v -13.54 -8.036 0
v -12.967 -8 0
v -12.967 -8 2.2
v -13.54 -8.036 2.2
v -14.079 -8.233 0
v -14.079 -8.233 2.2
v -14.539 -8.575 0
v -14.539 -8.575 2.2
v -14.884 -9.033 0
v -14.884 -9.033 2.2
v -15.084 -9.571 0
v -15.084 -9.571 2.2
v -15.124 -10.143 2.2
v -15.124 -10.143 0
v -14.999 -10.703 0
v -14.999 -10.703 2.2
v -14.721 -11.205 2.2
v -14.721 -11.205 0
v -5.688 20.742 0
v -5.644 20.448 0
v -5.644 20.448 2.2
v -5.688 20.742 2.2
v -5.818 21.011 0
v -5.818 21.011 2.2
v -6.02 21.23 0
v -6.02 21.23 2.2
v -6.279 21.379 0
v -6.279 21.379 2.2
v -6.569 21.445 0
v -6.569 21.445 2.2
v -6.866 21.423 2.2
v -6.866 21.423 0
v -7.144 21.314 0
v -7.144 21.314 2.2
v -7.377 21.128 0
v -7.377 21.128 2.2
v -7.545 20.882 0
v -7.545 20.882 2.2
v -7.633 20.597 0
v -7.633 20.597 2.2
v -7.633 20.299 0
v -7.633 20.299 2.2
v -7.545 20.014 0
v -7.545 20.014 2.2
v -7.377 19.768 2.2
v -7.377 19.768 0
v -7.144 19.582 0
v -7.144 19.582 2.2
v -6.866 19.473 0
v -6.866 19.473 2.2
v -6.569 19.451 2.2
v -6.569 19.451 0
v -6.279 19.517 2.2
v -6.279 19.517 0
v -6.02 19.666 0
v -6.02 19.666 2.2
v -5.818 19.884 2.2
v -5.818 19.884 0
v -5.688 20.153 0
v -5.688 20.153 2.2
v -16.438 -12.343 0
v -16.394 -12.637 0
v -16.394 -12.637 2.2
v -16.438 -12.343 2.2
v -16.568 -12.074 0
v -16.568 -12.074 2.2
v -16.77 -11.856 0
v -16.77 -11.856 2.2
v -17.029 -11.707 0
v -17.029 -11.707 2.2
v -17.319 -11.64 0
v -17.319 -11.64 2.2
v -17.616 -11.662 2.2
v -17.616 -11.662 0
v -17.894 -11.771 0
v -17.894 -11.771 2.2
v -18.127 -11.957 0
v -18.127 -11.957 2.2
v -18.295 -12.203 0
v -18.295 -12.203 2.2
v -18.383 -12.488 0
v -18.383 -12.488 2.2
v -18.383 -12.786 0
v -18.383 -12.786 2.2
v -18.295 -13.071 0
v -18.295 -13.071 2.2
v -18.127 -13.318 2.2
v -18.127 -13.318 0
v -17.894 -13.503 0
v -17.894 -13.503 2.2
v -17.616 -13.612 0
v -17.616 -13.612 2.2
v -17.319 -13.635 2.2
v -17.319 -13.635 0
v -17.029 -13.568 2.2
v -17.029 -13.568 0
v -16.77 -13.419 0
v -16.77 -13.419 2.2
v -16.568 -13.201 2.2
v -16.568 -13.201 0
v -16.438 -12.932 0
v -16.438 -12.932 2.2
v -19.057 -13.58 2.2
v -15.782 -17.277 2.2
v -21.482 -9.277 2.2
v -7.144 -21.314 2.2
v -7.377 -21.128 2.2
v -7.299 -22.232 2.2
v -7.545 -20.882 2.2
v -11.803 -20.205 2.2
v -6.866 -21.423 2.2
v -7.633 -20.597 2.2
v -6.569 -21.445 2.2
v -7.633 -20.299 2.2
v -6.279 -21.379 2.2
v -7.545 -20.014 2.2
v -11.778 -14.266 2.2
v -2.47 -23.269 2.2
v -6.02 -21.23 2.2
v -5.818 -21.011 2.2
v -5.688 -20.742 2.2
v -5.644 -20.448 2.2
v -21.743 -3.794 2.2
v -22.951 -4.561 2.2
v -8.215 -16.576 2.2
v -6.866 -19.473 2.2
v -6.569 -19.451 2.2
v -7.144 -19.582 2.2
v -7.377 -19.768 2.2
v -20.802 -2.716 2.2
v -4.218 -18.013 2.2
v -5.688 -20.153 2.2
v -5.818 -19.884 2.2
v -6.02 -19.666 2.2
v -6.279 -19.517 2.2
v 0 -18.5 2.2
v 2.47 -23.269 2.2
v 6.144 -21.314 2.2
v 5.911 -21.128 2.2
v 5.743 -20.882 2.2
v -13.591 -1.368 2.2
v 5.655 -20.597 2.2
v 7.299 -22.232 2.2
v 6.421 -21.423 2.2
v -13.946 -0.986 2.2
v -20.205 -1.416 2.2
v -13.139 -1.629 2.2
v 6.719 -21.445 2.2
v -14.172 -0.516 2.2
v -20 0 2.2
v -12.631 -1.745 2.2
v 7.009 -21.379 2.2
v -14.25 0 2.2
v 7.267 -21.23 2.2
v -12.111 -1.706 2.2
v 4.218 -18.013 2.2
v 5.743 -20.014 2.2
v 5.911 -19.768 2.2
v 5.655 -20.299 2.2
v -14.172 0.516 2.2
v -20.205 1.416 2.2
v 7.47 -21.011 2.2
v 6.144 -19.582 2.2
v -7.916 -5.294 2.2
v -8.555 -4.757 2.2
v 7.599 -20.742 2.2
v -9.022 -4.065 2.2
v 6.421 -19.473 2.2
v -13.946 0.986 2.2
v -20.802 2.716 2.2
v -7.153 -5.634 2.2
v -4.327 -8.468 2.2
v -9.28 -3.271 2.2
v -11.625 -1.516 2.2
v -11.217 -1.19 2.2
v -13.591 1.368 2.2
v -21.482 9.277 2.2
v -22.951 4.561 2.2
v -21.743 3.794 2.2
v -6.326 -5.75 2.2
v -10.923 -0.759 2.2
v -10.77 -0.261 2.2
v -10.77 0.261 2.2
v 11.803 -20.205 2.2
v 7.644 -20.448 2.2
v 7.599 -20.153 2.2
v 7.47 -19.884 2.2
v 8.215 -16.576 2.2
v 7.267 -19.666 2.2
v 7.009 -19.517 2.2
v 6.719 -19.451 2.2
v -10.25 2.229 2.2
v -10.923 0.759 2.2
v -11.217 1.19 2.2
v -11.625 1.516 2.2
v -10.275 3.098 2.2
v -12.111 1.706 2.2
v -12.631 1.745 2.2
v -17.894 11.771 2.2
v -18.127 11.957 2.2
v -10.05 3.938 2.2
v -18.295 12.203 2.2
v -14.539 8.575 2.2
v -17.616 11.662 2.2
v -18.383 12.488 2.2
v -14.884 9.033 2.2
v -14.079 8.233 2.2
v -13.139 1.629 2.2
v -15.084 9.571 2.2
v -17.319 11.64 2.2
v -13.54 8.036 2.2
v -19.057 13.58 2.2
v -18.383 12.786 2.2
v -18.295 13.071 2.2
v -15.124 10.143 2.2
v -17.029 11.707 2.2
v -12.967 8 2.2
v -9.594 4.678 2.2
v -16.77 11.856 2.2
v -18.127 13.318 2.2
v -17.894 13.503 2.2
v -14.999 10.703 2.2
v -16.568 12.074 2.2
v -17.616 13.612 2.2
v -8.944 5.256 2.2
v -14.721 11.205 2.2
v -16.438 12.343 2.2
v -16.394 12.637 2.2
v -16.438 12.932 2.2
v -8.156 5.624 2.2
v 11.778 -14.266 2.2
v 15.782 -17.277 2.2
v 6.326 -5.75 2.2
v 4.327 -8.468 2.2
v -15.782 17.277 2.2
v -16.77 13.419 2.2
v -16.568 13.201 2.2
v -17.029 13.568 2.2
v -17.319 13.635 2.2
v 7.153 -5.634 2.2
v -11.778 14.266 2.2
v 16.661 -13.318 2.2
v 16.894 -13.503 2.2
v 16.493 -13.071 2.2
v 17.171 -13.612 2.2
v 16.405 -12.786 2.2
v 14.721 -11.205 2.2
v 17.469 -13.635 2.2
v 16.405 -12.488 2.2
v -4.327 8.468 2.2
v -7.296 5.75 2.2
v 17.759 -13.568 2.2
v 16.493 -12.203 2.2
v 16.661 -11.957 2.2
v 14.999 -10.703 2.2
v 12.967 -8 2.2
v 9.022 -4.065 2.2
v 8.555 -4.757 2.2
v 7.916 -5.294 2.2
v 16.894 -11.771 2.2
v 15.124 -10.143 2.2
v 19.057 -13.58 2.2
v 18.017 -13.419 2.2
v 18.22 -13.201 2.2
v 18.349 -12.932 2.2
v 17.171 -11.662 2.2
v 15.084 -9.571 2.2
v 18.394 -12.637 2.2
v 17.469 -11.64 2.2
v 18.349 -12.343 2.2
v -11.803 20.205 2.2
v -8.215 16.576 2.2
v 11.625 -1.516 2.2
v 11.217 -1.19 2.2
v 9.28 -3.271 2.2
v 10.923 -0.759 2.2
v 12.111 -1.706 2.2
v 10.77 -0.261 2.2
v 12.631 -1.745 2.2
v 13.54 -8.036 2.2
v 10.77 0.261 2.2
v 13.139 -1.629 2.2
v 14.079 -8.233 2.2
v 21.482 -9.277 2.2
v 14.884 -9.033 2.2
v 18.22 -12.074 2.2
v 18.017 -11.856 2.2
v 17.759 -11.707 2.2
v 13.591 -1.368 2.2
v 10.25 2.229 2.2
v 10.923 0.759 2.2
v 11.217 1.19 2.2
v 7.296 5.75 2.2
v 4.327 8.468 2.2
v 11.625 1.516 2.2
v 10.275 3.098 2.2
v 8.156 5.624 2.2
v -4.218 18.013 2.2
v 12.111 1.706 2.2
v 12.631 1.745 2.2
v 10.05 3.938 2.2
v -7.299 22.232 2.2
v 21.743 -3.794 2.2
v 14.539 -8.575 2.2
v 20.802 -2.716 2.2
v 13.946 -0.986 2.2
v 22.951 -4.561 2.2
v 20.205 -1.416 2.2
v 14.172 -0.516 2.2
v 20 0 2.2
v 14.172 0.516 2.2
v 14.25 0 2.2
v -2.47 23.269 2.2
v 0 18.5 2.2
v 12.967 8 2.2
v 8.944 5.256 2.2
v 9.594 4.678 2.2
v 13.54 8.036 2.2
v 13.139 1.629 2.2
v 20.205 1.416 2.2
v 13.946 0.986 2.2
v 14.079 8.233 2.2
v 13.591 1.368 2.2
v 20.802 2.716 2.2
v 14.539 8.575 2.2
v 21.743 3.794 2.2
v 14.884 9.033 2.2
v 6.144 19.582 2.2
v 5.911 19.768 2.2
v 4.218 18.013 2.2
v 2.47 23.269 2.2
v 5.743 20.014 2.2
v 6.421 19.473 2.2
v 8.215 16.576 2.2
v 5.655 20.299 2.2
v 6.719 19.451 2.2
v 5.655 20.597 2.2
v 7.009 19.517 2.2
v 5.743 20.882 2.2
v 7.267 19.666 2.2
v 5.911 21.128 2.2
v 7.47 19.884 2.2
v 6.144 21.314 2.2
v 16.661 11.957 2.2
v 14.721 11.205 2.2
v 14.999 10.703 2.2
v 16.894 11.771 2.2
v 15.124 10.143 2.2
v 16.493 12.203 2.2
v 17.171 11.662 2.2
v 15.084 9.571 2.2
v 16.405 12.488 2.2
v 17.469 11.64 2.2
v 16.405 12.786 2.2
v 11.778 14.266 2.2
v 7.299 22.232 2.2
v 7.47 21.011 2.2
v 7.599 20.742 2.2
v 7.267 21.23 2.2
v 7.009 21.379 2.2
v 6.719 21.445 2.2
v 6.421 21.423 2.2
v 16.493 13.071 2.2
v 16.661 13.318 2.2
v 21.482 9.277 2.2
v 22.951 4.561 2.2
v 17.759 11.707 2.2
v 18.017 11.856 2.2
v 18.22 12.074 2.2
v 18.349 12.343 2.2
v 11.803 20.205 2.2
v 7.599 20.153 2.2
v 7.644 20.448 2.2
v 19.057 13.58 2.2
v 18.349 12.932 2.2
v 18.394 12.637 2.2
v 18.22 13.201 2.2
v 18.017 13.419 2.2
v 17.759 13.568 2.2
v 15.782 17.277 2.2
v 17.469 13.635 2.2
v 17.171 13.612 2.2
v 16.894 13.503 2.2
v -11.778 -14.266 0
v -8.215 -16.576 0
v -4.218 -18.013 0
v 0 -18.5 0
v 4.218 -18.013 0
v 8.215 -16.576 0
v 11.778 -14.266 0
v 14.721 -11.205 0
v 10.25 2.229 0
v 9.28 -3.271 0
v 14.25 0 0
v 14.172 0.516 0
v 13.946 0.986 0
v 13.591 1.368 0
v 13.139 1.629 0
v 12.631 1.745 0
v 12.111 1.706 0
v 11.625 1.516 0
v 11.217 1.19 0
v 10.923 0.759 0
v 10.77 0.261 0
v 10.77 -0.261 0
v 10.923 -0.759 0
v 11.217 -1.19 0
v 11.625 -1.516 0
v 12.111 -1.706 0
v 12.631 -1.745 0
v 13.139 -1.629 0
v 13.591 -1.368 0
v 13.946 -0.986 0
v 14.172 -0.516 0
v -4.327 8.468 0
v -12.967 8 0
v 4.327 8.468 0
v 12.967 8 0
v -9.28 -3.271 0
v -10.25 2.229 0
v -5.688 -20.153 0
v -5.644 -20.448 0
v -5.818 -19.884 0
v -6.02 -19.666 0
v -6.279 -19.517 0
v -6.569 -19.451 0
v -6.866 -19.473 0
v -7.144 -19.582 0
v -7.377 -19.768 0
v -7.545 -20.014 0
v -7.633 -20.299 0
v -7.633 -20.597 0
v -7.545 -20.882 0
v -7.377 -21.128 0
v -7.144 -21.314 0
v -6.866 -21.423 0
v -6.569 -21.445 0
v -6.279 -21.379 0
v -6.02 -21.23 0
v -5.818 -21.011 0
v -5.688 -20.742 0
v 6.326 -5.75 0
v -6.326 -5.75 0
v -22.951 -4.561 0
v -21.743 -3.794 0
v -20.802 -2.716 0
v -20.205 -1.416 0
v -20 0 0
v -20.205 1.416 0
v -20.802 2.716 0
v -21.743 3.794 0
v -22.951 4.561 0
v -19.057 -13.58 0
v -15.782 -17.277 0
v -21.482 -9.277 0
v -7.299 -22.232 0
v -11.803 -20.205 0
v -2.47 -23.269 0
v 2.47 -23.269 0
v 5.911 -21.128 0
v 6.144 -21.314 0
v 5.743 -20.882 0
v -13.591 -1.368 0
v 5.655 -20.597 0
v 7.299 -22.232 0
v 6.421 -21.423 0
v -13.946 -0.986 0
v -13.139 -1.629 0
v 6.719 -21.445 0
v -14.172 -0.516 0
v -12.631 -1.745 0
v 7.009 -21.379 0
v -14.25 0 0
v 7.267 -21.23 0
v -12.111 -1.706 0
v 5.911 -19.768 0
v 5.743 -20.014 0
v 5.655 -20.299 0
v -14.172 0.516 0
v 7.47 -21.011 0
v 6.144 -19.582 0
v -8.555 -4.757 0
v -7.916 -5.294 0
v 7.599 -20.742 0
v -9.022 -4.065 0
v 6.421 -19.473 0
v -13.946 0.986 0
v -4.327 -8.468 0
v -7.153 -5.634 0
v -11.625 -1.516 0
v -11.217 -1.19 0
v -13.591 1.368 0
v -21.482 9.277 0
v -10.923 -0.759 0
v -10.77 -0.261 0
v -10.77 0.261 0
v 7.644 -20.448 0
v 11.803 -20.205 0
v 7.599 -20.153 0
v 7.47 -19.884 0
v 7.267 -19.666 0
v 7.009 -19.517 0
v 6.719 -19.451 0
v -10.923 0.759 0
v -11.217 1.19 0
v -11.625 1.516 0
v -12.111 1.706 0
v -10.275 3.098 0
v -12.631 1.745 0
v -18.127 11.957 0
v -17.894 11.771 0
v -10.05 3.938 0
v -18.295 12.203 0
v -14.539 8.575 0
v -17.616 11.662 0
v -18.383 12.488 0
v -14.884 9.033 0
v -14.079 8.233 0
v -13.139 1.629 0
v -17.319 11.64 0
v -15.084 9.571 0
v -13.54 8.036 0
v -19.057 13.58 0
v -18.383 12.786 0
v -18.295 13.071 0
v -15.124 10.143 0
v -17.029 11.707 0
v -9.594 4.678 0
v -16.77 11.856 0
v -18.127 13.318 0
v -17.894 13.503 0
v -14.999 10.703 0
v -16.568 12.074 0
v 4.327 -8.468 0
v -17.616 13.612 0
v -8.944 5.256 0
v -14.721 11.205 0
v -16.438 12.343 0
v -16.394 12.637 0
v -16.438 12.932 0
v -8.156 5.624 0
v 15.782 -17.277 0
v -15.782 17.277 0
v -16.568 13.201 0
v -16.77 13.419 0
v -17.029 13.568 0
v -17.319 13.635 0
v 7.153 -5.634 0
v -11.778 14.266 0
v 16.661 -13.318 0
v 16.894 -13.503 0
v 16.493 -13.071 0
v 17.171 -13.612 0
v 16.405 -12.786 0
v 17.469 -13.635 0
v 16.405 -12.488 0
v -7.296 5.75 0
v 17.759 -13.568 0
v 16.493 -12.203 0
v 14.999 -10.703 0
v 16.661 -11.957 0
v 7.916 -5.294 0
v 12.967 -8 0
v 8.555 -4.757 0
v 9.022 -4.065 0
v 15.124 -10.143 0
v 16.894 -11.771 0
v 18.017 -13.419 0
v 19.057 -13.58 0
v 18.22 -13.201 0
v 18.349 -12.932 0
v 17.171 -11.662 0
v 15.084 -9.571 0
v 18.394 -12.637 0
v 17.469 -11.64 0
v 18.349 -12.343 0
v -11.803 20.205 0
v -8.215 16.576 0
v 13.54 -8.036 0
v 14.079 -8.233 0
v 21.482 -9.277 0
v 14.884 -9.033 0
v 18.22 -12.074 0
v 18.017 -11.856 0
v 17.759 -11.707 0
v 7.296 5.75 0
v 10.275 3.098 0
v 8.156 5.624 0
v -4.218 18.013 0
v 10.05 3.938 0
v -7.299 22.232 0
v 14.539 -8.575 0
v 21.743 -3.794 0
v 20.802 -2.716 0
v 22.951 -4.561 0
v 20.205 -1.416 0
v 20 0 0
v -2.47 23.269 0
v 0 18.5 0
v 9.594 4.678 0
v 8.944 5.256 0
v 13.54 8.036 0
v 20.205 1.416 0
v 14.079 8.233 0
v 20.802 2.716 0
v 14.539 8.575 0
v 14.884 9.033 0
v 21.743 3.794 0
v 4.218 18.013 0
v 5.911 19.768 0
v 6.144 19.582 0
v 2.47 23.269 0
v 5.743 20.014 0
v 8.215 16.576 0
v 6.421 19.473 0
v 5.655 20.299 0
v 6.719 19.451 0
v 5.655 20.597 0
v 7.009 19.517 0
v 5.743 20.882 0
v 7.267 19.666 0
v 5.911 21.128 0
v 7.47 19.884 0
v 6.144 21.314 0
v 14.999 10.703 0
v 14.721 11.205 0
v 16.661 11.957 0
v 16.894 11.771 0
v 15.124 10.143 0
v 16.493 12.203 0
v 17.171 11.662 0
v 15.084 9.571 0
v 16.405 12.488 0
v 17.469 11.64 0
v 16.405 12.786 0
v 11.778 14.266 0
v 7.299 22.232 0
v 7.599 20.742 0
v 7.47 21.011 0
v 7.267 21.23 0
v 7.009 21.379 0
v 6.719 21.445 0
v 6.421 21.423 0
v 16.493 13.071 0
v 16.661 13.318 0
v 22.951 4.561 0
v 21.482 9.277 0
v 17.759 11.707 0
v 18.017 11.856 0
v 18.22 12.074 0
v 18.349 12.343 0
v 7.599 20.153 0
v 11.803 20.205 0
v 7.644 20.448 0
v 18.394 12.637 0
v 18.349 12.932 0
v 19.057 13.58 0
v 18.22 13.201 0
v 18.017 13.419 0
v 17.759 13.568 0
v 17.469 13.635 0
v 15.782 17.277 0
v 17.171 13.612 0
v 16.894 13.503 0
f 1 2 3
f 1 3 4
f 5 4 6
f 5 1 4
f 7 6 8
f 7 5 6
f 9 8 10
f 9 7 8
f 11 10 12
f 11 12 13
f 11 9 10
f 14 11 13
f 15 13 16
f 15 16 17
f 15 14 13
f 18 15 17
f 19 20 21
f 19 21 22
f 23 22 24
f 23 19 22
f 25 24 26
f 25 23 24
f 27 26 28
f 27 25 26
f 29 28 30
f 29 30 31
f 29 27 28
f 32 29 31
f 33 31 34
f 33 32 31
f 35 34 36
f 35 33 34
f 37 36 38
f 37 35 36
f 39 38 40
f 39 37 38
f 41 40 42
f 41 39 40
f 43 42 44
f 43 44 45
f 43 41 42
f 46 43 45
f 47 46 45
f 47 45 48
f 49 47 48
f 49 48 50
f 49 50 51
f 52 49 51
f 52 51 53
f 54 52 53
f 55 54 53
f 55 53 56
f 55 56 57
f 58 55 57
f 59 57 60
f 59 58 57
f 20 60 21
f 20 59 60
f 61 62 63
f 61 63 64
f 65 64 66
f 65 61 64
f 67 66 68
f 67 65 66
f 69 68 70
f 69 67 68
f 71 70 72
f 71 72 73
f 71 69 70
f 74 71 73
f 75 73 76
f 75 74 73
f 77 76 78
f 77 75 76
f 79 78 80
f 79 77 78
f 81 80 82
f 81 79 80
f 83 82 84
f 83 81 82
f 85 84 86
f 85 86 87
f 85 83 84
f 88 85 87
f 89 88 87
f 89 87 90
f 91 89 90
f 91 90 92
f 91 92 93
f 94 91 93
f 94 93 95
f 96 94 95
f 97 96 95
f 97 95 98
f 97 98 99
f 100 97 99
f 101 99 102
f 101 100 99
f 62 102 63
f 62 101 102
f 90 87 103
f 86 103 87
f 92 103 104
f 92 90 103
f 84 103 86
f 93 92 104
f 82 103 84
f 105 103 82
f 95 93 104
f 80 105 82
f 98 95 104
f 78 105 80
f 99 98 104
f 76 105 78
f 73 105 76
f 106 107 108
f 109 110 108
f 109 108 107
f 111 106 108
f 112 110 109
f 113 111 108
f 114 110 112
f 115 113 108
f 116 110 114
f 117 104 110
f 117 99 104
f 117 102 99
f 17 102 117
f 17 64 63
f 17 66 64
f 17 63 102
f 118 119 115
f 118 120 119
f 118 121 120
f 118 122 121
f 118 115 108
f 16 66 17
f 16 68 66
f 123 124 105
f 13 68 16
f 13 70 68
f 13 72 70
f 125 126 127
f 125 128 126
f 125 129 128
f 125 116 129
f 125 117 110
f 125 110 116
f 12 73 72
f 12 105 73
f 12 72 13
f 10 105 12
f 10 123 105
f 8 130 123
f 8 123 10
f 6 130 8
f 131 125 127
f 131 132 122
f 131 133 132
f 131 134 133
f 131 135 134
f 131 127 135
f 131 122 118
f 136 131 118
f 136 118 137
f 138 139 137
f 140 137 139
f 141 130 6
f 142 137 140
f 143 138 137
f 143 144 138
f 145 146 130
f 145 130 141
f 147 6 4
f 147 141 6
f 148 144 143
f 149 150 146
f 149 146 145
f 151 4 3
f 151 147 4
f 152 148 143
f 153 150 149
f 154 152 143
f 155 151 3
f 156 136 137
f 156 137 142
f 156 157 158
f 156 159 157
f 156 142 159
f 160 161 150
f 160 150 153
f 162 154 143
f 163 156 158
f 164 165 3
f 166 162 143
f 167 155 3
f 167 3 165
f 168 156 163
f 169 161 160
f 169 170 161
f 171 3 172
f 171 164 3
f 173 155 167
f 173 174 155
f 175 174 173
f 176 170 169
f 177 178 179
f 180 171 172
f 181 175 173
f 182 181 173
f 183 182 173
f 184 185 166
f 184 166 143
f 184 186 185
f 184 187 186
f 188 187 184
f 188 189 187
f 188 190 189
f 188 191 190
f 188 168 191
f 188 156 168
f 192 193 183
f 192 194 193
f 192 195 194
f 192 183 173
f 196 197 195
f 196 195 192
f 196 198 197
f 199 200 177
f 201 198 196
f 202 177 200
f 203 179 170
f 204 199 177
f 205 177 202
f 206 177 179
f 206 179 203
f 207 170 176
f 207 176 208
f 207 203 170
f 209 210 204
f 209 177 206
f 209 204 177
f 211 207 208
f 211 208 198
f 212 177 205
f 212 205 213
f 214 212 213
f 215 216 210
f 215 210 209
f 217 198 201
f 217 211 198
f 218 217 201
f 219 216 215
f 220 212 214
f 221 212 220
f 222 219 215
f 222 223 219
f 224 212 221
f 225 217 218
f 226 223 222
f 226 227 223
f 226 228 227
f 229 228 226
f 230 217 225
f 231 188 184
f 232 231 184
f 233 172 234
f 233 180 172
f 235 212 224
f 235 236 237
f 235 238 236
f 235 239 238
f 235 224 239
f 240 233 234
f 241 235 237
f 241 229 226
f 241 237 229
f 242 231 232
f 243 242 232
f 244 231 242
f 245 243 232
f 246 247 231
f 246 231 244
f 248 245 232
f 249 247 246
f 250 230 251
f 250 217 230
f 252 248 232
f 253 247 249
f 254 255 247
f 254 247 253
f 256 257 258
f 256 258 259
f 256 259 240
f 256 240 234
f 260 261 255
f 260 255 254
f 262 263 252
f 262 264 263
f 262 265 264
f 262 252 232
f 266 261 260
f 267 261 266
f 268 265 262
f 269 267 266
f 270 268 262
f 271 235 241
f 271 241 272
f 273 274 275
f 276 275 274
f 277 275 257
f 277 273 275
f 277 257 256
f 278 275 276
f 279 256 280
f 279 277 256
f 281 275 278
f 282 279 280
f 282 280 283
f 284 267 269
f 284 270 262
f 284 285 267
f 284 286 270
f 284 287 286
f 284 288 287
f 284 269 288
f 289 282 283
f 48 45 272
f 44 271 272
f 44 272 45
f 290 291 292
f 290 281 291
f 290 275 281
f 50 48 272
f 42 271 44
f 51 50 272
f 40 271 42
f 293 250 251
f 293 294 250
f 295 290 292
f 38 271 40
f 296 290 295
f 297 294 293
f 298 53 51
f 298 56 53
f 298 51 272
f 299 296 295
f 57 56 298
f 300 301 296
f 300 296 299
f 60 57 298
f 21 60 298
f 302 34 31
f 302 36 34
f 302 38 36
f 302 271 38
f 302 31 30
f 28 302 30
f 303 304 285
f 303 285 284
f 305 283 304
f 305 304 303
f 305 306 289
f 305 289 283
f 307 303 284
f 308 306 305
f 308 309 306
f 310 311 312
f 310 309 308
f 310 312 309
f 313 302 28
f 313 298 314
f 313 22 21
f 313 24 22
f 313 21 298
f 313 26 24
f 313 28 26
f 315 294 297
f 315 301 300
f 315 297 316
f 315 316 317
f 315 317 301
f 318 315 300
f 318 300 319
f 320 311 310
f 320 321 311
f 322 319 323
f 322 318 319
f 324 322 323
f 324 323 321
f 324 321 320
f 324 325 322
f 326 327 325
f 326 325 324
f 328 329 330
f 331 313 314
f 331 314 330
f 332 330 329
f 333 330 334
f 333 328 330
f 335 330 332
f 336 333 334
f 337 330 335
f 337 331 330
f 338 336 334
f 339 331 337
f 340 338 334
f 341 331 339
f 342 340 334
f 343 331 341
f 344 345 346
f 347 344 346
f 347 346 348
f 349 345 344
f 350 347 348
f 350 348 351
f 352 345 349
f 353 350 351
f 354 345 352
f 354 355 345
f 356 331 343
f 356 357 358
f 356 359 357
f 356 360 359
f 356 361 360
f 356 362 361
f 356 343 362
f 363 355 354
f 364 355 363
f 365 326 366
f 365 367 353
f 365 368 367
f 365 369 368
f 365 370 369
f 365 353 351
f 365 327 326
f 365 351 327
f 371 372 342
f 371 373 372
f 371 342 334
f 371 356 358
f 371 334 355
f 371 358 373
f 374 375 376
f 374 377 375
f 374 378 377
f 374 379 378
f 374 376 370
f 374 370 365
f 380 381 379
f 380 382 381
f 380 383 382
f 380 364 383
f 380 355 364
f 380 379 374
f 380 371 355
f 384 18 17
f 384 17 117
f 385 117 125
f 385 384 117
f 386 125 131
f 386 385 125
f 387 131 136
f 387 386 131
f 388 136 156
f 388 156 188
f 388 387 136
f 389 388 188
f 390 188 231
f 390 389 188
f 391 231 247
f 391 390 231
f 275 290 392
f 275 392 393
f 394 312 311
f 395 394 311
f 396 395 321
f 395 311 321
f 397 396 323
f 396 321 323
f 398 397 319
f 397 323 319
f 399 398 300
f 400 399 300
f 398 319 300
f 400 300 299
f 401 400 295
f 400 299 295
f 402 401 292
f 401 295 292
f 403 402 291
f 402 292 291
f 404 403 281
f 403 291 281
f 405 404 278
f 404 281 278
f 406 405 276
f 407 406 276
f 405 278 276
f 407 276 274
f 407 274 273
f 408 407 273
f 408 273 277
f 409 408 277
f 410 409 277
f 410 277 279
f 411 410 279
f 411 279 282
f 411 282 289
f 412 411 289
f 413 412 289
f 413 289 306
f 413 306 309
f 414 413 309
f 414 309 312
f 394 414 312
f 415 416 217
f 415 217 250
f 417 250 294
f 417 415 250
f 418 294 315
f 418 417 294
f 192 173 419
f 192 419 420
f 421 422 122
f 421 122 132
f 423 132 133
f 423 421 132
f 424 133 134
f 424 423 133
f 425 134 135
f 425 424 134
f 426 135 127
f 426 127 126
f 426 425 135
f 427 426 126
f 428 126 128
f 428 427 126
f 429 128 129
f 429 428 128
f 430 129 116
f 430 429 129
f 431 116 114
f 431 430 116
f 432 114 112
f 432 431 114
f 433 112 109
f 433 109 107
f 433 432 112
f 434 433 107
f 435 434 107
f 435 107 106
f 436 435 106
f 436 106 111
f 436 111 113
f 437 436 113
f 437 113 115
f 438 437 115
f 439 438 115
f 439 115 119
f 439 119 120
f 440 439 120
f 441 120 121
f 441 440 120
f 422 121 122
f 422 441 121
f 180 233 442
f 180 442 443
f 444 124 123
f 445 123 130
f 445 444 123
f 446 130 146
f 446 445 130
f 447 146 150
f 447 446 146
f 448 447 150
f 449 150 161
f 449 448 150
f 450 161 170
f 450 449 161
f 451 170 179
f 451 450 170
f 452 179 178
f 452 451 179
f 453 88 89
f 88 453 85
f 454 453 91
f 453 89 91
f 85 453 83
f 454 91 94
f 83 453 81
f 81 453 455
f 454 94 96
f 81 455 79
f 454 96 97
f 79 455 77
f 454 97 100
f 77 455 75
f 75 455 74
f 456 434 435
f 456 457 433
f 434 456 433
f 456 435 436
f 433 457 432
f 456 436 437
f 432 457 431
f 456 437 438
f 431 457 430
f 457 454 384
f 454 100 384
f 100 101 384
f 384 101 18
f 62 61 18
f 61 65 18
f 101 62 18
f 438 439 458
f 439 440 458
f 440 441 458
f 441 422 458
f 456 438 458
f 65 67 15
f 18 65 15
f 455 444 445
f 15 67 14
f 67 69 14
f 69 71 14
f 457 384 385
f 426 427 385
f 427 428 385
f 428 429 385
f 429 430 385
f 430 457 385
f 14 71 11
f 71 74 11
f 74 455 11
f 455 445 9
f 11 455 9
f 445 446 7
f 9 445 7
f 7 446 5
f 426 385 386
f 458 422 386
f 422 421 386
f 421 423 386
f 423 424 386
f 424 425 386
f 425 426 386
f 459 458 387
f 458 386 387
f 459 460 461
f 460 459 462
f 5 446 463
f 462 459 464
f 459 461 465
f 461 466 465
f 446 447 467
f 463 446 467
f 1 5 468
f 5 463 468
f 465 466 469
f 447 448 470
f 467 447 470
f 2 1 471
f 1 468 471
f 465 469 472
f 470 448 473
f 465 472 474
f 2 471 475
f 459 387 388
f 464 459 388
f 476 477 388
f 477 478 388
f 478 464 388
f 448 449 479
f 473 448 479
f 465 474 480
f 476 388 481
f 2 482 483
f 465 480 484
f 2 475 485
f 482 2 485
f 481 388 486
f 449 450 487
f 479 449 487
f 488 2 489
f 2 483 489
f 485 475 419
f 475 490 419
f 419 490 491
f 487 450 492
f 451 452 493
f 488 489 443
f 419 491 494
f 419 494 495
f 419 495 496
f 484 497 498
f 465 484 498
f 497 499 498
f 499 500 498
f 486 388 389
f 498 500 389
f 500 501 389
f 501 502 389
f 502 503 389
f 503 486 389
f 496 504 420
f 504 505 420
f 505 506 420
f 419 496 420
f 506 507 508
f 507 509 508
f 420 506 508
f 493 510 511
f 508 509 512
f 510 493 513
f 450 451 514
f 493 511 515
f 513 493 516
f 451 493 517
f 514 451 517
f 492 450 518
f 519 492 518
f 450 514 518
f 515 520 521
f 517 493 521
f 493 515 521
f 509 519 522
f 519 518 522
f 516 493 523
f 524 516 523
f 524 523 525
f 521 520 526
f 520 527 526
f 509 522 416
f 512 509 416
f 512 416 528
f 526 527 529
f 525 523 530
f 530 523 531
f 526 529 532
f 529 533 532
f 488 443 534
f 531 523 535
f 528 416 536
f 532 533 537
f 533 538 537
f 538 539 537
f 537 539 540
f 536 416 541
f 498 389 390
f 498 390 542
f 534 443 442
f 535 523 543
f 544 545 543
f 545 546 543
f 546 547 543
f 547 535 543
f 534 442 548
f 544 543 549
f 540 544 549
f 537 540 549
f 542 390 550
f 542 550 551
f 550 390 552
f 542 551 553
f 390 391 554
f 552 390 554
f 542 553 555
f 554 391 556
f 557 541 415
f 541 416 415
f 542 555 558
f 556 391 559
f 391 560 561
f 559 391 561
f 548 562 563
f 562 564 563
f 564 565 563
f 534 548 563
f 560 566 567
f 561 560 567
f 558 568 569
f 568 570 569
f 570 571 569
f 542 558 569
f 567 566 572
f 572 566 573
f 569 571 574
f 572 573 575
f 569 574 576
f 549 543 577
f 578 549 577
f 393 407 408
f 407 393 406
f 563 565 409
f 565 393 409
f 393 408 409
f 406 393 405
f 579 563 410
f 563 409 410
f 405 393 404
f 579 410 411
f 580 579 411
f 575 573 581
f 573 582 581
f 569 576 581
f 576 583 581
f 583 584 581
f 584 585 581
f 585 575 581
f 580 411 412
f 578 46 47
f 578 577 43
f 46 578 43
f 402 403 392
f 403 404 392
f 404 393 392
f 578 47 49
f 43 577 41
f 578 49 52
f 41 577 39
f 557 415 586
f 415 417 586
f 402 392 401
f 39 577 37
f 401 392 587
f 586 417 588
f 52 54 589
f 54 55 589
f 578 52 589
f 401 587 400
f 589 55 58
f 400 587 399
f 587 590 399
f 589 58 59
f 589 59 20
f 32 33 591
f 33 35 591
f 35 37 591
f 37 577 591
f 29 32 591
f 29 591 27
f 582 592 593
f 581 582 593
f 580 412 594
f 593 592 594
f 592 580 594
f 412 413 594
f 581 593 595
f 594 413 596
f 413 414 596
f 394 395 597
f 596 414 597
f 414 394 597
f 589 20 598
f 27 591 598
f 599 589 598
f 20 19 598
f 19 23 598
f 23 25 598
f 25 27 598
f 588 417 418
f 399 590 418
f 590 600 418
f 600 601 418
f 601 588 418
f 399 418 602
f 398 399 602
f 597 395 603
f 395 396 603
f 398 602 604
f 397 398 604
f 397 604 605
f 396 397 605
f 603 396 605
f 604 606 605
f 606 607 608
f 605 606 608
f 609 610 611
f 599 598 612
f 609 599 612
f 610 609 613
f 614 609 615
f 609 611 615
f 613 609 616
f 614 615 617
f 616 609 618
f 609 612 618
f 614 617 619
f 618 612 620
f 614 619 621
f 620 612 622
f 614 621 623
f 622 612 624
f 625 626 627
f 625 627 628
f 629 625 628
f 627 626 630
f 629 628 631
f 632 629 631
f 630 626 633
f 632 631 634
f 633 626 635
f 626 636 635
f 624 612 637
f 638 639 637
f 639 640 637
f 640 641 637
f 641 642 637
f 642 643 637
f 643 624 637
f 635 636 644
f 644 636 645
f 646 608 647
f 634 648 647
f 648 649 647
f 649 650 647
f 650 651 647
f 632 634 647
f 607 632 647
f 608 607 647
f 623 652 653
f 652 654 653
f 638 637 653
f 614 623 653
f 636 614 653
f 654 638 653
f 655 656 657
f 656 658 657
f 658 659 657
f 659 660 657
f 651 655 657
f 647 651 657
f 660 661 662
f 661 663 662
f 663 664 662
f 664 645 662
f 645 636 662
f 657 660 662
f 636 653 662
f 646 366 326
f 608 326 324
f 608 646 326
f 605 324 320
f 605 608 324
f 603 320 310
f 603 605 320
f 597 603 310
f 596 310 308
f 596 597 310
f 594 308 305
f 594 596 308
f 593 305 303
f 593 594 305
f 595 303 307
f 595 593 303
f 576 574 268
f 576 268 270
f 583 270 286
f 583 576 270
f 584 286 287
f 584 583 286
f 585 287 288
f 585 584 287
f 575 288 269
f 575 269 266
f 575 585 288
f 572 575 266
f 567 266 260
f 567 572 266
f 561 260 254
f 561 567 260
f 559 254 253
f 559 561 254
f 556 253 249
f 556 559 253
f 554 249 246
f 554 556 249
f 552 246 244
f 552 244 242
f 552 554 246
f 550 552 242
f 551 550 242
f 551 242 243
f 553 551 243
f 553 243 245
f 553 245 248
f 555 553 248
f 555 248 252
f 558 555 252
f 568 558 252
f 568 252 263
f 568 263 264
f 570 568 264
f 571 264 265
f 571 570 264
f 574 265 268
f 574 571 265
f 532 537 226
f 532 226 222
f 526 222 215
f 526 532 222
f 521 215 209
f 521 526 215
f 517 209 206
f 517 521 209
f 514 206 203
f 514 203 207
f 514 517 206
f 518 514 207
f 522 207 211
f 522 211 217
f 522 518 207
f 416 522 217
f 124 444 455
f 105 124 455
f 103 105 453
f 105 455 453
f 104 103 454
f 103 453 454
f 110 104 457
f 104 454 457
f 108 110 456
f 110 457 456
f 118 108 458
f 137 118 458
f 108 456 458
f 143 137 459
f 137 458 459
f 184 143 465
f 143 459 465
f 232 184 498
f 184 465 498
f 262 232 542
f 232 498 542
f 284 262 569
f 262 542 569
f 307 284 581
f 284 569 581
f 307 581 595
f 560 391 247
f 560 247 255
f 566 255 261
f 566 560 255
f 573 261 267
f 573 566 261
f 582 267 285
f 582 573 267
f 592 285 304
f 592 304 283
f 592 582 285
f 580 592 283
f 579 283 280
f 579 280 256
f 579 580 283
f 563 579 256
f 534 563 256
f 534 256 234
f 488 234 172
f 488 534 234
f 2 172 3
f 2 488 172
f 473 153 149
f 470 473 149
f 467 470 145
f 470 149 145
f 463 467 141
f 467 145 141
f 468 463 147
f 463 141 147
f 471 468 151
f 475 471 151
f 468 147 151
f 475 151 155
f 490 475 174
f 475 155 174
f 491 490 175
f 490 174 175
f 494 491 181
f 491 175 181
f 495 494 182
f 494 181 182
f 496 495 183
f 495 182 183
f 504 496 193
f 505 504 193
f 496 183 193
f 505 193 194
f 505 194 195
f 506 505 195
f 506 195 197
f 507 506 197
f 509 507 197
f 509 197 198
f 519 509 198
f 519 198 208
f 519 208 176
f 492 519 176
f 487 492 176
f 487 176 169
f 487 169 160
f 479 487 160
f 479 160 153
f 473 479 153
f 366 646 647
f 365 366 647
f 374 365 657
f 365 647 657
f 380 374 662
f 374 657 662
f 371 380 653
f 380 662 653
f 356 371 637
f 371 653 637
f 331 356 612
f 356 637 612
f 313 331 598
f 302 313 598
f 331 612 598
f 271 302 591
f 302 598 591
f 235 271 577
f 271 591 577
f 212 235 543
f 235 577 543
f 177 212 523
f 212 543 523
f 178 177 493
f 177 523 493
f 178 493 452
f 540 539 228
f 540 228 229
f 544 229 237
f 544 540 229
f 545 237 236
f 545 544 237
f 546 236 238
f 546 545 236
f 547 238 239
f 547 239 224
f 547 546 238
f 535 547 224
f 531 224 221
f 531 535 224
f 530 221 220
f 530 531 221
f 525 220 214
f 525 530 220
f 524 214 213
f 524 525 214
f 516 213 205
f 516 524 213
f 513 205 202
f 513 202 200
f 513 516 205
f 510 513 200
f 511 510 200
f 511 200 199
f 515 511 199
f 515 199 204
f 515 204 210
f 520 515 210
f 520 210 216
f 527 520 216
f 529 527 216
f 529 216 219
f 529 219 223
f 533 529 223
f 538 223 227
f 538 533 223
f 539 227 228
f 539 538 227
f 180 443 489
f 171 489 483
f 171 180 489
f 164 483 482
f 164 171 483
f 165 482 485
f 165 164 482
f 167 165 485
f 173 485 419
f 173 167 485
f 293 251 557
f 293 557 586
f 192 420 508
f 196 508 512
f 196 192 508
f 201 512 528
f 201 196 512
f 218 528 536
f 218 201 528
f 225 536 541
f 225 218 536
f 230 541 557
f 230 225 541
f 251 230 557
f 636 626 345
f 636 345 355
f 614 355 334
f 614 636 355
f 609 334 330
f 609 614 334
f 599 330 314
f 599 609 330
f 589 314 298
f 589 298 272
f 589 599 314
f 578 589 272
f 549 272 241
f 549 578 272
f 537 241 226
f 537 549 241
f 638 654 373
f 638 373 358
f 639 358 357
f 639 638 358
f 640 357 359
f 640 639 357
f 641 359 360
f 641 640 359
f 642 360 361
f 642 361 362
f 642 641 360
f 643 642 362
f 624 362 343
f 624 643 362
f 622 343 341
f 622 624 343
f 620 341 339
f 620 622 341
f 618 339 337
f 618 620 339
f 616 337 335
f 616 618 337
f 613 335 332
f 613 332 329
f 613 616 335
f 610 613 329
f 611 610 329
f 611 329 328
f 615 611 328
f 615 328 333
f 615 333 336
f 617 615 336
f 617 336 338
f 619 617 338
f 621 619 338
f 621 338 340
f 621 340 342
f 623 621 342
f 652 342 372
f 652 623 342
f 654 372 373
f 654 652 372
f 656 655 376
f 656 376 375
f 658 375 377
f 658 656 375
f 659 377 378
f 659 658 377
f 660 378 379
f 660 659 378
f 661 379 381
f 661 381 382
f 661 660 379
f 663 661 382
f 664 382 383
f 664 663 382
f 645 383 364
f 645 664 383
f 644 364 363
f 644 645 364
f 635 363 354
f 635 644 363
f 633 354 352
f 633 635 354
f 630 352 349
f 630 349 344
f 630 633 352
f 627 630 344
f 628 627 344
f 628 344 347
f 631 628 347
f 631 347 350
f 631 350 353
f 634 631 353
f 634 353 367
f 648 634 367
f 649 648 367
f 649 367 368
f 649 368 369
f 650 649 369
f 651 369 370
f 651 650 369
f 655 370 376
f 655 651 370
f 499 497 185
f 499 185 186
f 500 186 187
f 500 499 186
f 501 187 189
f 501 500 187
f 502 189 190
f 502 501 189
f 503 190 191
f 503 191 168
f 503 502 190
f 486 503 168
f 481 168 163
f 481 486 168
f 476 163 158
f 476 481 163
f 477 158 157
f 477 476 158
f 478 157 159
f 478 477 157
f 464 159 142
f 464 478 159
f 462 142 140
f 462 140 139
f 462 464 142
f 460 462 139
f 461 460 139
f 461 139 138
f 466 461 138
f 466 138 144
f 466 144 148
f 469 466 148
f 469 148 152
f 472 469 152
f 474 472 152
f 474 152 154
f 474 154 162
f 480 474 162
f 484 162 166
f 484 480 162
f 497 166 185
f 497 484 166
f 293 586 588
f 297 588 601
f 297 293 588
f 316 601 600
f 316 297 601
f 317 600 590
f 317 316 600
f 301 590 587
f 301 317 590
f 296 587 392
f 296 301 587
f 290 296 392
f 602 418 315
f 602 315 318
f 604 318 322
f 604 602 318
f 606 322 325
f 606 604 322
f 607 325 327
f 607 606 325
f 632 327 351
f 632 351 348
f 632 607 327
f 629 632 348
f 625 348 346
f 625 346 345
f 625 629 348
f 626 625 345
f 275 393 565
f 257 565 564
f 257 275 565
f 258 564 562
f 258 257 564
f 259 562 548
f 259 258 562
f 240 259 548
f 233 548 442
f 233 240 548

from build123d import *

# Parameters (mm, degrees)
SKIZZE1_R                       = 23.4
SKIZZE1_R_2                     = 1
LINEAR_AUSTRAGEN1_DEPTH         = 2.2
SKIZZE3_R                       = 1.75
SCHNITT_LINEAR_AUSTRAGEN3_DEPTH = 34.165644875
SKETCH1_R                       = 5
CUT_EXTRUDE1_DEPTH              = 3


with BuildPart() as part:
    # Skizze1 → Linear austragen1 (new body)
    with BuildSketch(Plane.XY):
        Circle(SKIZZE1_R)
        with Locations((6.643865379, 20.4477151)):
            Circle(SKIZZE1_R_2, mode=Mode.SUBTRACT)
        with Locations((17.393865379, 12.637382924)):
            Circle(SKIZZE1_R_2, mode=Mode.SUBTRACT)
        with Locations((17.393865379, -12.637382924)):
            Circle(SKIZZE1_R_2, mode=Mode.SUBTRACT)
        with Locations((-6.643865379, 20.4477151)):
            Circle(SKIZZE1_R_2, mode=Mode.SUBTRACT)
        with Locations((6.643865379, -20.4477151)):
            Circle(SKIZZE1_R_2, mode=Mode.SUBTRACT)
        with Locations((-6.643865379, -20.4477151)):
            Circle(SKIZZE1_R_2, mode=Mode.SUBTRACT)
        with Locations((-17.393865379, -12.637382924)):
            Circle(SKIZZE1_R_2, mode=Mode.SUBTRACT)
        with Locations((-17.393865379, 12.637382924)):
            Circle(SKIZZE1_R_2, mode=Mode.SUBTRACT)
        with BuildLine():
            ThreePointArc((14.720859381, 11.20474449), (0, 18.5), (-14.720859381, 11.20474449))
            ThreePointArc((-14.720859381, 11.20474449), (-14.883940446, 9.033399462), (-12.967323579, 8))
            ThreePointArc((-12.967323579, 8), (0, 8.526339105), (12.967323579, 8))
            ThreePointArc((12.967323579, 8), (14.883940446, 9.033399462), (14.720859381, 11.20474449))
        make_face(mode=Mode.SUBTRACT)
        with BuildLine():
            ThreePointArc((-14.720859381, -11.20474449), (0, -18.5), (14.720859381, -11.20474449))
            ThreePointArc((14.720859381, -11.20474449), (14.883940446, -9.033399462), (12.967323579, -8))
            ThreePointArc((12.967323579, -8), (0, -8.526339105), (-12.967323579, -8))
            ThreePointArc((-12.967323579, -8), (-14.883940446, -9.033399462), (-14.720859381, -11.20474449))
        make_face(mode=Mode.SUBTRACT)
    extrude(amount=LINEAR_AUSTRAGEN1_DEPTH)

    # Skizze3 → Schnitt-Linear austragen3 (cut, through all)
    with BuildSketch(Plane.XY.offset(2.2)):
        with Locations((12.5, 0)):
            Circle(SKIZZE3_R)
        with Locations(Location((-12.5, 0, 0), (0, 0, 180))):
            Circle(SKIZZE3_R)
        with BuildLine():
            Line((-7.295576741, 5.75), (7.295576741, 5.75))
            ThreePointArc((7.295576741, 5.75), (9.59371007, 4.678362829), (10.25, 2.229055467))
            Line((10.25, 2.229055467), (9.280201606, -3.270944533))
            ThreePointArc((9.280201606, -3.270944533), (8.254141176, -5.048133329), (6.325778347, -5.75))
            Line((6.325778347, -5.75), (-6.325778347, -5.75))
            ThreePointArc((-6.325778347, -5.75), (-8.254141176, -5.048133329), (-9.280201606, -3.270944533))
            Line((-9.280201606, -3.270944533), (-10.25, 2.229055467))
            ThreePointArc((-10.25, 2.229055467), (-9.59371007, 4.678362829), (-7.295576741, 5.75))
        make_face()
    extrude(amount=-SCHNITT_LINEAR_AUSTRAGEN3_DEPTH, mode=Mode.SUBTRACT)

    # Sketch1 → Cut-Extrude1 (cut)
    with BuildSketch(Plane.XY):
        with Locations((-25, 0)):
            Circle(SKETCH1_R)
        with Locations((25, 0)):
            Circle(SKETCH1_R)
    extrude(amount=CUT_EXTRUDE1_DEPTH, mode=Mode.SUBTRACT)


solid = part.part
